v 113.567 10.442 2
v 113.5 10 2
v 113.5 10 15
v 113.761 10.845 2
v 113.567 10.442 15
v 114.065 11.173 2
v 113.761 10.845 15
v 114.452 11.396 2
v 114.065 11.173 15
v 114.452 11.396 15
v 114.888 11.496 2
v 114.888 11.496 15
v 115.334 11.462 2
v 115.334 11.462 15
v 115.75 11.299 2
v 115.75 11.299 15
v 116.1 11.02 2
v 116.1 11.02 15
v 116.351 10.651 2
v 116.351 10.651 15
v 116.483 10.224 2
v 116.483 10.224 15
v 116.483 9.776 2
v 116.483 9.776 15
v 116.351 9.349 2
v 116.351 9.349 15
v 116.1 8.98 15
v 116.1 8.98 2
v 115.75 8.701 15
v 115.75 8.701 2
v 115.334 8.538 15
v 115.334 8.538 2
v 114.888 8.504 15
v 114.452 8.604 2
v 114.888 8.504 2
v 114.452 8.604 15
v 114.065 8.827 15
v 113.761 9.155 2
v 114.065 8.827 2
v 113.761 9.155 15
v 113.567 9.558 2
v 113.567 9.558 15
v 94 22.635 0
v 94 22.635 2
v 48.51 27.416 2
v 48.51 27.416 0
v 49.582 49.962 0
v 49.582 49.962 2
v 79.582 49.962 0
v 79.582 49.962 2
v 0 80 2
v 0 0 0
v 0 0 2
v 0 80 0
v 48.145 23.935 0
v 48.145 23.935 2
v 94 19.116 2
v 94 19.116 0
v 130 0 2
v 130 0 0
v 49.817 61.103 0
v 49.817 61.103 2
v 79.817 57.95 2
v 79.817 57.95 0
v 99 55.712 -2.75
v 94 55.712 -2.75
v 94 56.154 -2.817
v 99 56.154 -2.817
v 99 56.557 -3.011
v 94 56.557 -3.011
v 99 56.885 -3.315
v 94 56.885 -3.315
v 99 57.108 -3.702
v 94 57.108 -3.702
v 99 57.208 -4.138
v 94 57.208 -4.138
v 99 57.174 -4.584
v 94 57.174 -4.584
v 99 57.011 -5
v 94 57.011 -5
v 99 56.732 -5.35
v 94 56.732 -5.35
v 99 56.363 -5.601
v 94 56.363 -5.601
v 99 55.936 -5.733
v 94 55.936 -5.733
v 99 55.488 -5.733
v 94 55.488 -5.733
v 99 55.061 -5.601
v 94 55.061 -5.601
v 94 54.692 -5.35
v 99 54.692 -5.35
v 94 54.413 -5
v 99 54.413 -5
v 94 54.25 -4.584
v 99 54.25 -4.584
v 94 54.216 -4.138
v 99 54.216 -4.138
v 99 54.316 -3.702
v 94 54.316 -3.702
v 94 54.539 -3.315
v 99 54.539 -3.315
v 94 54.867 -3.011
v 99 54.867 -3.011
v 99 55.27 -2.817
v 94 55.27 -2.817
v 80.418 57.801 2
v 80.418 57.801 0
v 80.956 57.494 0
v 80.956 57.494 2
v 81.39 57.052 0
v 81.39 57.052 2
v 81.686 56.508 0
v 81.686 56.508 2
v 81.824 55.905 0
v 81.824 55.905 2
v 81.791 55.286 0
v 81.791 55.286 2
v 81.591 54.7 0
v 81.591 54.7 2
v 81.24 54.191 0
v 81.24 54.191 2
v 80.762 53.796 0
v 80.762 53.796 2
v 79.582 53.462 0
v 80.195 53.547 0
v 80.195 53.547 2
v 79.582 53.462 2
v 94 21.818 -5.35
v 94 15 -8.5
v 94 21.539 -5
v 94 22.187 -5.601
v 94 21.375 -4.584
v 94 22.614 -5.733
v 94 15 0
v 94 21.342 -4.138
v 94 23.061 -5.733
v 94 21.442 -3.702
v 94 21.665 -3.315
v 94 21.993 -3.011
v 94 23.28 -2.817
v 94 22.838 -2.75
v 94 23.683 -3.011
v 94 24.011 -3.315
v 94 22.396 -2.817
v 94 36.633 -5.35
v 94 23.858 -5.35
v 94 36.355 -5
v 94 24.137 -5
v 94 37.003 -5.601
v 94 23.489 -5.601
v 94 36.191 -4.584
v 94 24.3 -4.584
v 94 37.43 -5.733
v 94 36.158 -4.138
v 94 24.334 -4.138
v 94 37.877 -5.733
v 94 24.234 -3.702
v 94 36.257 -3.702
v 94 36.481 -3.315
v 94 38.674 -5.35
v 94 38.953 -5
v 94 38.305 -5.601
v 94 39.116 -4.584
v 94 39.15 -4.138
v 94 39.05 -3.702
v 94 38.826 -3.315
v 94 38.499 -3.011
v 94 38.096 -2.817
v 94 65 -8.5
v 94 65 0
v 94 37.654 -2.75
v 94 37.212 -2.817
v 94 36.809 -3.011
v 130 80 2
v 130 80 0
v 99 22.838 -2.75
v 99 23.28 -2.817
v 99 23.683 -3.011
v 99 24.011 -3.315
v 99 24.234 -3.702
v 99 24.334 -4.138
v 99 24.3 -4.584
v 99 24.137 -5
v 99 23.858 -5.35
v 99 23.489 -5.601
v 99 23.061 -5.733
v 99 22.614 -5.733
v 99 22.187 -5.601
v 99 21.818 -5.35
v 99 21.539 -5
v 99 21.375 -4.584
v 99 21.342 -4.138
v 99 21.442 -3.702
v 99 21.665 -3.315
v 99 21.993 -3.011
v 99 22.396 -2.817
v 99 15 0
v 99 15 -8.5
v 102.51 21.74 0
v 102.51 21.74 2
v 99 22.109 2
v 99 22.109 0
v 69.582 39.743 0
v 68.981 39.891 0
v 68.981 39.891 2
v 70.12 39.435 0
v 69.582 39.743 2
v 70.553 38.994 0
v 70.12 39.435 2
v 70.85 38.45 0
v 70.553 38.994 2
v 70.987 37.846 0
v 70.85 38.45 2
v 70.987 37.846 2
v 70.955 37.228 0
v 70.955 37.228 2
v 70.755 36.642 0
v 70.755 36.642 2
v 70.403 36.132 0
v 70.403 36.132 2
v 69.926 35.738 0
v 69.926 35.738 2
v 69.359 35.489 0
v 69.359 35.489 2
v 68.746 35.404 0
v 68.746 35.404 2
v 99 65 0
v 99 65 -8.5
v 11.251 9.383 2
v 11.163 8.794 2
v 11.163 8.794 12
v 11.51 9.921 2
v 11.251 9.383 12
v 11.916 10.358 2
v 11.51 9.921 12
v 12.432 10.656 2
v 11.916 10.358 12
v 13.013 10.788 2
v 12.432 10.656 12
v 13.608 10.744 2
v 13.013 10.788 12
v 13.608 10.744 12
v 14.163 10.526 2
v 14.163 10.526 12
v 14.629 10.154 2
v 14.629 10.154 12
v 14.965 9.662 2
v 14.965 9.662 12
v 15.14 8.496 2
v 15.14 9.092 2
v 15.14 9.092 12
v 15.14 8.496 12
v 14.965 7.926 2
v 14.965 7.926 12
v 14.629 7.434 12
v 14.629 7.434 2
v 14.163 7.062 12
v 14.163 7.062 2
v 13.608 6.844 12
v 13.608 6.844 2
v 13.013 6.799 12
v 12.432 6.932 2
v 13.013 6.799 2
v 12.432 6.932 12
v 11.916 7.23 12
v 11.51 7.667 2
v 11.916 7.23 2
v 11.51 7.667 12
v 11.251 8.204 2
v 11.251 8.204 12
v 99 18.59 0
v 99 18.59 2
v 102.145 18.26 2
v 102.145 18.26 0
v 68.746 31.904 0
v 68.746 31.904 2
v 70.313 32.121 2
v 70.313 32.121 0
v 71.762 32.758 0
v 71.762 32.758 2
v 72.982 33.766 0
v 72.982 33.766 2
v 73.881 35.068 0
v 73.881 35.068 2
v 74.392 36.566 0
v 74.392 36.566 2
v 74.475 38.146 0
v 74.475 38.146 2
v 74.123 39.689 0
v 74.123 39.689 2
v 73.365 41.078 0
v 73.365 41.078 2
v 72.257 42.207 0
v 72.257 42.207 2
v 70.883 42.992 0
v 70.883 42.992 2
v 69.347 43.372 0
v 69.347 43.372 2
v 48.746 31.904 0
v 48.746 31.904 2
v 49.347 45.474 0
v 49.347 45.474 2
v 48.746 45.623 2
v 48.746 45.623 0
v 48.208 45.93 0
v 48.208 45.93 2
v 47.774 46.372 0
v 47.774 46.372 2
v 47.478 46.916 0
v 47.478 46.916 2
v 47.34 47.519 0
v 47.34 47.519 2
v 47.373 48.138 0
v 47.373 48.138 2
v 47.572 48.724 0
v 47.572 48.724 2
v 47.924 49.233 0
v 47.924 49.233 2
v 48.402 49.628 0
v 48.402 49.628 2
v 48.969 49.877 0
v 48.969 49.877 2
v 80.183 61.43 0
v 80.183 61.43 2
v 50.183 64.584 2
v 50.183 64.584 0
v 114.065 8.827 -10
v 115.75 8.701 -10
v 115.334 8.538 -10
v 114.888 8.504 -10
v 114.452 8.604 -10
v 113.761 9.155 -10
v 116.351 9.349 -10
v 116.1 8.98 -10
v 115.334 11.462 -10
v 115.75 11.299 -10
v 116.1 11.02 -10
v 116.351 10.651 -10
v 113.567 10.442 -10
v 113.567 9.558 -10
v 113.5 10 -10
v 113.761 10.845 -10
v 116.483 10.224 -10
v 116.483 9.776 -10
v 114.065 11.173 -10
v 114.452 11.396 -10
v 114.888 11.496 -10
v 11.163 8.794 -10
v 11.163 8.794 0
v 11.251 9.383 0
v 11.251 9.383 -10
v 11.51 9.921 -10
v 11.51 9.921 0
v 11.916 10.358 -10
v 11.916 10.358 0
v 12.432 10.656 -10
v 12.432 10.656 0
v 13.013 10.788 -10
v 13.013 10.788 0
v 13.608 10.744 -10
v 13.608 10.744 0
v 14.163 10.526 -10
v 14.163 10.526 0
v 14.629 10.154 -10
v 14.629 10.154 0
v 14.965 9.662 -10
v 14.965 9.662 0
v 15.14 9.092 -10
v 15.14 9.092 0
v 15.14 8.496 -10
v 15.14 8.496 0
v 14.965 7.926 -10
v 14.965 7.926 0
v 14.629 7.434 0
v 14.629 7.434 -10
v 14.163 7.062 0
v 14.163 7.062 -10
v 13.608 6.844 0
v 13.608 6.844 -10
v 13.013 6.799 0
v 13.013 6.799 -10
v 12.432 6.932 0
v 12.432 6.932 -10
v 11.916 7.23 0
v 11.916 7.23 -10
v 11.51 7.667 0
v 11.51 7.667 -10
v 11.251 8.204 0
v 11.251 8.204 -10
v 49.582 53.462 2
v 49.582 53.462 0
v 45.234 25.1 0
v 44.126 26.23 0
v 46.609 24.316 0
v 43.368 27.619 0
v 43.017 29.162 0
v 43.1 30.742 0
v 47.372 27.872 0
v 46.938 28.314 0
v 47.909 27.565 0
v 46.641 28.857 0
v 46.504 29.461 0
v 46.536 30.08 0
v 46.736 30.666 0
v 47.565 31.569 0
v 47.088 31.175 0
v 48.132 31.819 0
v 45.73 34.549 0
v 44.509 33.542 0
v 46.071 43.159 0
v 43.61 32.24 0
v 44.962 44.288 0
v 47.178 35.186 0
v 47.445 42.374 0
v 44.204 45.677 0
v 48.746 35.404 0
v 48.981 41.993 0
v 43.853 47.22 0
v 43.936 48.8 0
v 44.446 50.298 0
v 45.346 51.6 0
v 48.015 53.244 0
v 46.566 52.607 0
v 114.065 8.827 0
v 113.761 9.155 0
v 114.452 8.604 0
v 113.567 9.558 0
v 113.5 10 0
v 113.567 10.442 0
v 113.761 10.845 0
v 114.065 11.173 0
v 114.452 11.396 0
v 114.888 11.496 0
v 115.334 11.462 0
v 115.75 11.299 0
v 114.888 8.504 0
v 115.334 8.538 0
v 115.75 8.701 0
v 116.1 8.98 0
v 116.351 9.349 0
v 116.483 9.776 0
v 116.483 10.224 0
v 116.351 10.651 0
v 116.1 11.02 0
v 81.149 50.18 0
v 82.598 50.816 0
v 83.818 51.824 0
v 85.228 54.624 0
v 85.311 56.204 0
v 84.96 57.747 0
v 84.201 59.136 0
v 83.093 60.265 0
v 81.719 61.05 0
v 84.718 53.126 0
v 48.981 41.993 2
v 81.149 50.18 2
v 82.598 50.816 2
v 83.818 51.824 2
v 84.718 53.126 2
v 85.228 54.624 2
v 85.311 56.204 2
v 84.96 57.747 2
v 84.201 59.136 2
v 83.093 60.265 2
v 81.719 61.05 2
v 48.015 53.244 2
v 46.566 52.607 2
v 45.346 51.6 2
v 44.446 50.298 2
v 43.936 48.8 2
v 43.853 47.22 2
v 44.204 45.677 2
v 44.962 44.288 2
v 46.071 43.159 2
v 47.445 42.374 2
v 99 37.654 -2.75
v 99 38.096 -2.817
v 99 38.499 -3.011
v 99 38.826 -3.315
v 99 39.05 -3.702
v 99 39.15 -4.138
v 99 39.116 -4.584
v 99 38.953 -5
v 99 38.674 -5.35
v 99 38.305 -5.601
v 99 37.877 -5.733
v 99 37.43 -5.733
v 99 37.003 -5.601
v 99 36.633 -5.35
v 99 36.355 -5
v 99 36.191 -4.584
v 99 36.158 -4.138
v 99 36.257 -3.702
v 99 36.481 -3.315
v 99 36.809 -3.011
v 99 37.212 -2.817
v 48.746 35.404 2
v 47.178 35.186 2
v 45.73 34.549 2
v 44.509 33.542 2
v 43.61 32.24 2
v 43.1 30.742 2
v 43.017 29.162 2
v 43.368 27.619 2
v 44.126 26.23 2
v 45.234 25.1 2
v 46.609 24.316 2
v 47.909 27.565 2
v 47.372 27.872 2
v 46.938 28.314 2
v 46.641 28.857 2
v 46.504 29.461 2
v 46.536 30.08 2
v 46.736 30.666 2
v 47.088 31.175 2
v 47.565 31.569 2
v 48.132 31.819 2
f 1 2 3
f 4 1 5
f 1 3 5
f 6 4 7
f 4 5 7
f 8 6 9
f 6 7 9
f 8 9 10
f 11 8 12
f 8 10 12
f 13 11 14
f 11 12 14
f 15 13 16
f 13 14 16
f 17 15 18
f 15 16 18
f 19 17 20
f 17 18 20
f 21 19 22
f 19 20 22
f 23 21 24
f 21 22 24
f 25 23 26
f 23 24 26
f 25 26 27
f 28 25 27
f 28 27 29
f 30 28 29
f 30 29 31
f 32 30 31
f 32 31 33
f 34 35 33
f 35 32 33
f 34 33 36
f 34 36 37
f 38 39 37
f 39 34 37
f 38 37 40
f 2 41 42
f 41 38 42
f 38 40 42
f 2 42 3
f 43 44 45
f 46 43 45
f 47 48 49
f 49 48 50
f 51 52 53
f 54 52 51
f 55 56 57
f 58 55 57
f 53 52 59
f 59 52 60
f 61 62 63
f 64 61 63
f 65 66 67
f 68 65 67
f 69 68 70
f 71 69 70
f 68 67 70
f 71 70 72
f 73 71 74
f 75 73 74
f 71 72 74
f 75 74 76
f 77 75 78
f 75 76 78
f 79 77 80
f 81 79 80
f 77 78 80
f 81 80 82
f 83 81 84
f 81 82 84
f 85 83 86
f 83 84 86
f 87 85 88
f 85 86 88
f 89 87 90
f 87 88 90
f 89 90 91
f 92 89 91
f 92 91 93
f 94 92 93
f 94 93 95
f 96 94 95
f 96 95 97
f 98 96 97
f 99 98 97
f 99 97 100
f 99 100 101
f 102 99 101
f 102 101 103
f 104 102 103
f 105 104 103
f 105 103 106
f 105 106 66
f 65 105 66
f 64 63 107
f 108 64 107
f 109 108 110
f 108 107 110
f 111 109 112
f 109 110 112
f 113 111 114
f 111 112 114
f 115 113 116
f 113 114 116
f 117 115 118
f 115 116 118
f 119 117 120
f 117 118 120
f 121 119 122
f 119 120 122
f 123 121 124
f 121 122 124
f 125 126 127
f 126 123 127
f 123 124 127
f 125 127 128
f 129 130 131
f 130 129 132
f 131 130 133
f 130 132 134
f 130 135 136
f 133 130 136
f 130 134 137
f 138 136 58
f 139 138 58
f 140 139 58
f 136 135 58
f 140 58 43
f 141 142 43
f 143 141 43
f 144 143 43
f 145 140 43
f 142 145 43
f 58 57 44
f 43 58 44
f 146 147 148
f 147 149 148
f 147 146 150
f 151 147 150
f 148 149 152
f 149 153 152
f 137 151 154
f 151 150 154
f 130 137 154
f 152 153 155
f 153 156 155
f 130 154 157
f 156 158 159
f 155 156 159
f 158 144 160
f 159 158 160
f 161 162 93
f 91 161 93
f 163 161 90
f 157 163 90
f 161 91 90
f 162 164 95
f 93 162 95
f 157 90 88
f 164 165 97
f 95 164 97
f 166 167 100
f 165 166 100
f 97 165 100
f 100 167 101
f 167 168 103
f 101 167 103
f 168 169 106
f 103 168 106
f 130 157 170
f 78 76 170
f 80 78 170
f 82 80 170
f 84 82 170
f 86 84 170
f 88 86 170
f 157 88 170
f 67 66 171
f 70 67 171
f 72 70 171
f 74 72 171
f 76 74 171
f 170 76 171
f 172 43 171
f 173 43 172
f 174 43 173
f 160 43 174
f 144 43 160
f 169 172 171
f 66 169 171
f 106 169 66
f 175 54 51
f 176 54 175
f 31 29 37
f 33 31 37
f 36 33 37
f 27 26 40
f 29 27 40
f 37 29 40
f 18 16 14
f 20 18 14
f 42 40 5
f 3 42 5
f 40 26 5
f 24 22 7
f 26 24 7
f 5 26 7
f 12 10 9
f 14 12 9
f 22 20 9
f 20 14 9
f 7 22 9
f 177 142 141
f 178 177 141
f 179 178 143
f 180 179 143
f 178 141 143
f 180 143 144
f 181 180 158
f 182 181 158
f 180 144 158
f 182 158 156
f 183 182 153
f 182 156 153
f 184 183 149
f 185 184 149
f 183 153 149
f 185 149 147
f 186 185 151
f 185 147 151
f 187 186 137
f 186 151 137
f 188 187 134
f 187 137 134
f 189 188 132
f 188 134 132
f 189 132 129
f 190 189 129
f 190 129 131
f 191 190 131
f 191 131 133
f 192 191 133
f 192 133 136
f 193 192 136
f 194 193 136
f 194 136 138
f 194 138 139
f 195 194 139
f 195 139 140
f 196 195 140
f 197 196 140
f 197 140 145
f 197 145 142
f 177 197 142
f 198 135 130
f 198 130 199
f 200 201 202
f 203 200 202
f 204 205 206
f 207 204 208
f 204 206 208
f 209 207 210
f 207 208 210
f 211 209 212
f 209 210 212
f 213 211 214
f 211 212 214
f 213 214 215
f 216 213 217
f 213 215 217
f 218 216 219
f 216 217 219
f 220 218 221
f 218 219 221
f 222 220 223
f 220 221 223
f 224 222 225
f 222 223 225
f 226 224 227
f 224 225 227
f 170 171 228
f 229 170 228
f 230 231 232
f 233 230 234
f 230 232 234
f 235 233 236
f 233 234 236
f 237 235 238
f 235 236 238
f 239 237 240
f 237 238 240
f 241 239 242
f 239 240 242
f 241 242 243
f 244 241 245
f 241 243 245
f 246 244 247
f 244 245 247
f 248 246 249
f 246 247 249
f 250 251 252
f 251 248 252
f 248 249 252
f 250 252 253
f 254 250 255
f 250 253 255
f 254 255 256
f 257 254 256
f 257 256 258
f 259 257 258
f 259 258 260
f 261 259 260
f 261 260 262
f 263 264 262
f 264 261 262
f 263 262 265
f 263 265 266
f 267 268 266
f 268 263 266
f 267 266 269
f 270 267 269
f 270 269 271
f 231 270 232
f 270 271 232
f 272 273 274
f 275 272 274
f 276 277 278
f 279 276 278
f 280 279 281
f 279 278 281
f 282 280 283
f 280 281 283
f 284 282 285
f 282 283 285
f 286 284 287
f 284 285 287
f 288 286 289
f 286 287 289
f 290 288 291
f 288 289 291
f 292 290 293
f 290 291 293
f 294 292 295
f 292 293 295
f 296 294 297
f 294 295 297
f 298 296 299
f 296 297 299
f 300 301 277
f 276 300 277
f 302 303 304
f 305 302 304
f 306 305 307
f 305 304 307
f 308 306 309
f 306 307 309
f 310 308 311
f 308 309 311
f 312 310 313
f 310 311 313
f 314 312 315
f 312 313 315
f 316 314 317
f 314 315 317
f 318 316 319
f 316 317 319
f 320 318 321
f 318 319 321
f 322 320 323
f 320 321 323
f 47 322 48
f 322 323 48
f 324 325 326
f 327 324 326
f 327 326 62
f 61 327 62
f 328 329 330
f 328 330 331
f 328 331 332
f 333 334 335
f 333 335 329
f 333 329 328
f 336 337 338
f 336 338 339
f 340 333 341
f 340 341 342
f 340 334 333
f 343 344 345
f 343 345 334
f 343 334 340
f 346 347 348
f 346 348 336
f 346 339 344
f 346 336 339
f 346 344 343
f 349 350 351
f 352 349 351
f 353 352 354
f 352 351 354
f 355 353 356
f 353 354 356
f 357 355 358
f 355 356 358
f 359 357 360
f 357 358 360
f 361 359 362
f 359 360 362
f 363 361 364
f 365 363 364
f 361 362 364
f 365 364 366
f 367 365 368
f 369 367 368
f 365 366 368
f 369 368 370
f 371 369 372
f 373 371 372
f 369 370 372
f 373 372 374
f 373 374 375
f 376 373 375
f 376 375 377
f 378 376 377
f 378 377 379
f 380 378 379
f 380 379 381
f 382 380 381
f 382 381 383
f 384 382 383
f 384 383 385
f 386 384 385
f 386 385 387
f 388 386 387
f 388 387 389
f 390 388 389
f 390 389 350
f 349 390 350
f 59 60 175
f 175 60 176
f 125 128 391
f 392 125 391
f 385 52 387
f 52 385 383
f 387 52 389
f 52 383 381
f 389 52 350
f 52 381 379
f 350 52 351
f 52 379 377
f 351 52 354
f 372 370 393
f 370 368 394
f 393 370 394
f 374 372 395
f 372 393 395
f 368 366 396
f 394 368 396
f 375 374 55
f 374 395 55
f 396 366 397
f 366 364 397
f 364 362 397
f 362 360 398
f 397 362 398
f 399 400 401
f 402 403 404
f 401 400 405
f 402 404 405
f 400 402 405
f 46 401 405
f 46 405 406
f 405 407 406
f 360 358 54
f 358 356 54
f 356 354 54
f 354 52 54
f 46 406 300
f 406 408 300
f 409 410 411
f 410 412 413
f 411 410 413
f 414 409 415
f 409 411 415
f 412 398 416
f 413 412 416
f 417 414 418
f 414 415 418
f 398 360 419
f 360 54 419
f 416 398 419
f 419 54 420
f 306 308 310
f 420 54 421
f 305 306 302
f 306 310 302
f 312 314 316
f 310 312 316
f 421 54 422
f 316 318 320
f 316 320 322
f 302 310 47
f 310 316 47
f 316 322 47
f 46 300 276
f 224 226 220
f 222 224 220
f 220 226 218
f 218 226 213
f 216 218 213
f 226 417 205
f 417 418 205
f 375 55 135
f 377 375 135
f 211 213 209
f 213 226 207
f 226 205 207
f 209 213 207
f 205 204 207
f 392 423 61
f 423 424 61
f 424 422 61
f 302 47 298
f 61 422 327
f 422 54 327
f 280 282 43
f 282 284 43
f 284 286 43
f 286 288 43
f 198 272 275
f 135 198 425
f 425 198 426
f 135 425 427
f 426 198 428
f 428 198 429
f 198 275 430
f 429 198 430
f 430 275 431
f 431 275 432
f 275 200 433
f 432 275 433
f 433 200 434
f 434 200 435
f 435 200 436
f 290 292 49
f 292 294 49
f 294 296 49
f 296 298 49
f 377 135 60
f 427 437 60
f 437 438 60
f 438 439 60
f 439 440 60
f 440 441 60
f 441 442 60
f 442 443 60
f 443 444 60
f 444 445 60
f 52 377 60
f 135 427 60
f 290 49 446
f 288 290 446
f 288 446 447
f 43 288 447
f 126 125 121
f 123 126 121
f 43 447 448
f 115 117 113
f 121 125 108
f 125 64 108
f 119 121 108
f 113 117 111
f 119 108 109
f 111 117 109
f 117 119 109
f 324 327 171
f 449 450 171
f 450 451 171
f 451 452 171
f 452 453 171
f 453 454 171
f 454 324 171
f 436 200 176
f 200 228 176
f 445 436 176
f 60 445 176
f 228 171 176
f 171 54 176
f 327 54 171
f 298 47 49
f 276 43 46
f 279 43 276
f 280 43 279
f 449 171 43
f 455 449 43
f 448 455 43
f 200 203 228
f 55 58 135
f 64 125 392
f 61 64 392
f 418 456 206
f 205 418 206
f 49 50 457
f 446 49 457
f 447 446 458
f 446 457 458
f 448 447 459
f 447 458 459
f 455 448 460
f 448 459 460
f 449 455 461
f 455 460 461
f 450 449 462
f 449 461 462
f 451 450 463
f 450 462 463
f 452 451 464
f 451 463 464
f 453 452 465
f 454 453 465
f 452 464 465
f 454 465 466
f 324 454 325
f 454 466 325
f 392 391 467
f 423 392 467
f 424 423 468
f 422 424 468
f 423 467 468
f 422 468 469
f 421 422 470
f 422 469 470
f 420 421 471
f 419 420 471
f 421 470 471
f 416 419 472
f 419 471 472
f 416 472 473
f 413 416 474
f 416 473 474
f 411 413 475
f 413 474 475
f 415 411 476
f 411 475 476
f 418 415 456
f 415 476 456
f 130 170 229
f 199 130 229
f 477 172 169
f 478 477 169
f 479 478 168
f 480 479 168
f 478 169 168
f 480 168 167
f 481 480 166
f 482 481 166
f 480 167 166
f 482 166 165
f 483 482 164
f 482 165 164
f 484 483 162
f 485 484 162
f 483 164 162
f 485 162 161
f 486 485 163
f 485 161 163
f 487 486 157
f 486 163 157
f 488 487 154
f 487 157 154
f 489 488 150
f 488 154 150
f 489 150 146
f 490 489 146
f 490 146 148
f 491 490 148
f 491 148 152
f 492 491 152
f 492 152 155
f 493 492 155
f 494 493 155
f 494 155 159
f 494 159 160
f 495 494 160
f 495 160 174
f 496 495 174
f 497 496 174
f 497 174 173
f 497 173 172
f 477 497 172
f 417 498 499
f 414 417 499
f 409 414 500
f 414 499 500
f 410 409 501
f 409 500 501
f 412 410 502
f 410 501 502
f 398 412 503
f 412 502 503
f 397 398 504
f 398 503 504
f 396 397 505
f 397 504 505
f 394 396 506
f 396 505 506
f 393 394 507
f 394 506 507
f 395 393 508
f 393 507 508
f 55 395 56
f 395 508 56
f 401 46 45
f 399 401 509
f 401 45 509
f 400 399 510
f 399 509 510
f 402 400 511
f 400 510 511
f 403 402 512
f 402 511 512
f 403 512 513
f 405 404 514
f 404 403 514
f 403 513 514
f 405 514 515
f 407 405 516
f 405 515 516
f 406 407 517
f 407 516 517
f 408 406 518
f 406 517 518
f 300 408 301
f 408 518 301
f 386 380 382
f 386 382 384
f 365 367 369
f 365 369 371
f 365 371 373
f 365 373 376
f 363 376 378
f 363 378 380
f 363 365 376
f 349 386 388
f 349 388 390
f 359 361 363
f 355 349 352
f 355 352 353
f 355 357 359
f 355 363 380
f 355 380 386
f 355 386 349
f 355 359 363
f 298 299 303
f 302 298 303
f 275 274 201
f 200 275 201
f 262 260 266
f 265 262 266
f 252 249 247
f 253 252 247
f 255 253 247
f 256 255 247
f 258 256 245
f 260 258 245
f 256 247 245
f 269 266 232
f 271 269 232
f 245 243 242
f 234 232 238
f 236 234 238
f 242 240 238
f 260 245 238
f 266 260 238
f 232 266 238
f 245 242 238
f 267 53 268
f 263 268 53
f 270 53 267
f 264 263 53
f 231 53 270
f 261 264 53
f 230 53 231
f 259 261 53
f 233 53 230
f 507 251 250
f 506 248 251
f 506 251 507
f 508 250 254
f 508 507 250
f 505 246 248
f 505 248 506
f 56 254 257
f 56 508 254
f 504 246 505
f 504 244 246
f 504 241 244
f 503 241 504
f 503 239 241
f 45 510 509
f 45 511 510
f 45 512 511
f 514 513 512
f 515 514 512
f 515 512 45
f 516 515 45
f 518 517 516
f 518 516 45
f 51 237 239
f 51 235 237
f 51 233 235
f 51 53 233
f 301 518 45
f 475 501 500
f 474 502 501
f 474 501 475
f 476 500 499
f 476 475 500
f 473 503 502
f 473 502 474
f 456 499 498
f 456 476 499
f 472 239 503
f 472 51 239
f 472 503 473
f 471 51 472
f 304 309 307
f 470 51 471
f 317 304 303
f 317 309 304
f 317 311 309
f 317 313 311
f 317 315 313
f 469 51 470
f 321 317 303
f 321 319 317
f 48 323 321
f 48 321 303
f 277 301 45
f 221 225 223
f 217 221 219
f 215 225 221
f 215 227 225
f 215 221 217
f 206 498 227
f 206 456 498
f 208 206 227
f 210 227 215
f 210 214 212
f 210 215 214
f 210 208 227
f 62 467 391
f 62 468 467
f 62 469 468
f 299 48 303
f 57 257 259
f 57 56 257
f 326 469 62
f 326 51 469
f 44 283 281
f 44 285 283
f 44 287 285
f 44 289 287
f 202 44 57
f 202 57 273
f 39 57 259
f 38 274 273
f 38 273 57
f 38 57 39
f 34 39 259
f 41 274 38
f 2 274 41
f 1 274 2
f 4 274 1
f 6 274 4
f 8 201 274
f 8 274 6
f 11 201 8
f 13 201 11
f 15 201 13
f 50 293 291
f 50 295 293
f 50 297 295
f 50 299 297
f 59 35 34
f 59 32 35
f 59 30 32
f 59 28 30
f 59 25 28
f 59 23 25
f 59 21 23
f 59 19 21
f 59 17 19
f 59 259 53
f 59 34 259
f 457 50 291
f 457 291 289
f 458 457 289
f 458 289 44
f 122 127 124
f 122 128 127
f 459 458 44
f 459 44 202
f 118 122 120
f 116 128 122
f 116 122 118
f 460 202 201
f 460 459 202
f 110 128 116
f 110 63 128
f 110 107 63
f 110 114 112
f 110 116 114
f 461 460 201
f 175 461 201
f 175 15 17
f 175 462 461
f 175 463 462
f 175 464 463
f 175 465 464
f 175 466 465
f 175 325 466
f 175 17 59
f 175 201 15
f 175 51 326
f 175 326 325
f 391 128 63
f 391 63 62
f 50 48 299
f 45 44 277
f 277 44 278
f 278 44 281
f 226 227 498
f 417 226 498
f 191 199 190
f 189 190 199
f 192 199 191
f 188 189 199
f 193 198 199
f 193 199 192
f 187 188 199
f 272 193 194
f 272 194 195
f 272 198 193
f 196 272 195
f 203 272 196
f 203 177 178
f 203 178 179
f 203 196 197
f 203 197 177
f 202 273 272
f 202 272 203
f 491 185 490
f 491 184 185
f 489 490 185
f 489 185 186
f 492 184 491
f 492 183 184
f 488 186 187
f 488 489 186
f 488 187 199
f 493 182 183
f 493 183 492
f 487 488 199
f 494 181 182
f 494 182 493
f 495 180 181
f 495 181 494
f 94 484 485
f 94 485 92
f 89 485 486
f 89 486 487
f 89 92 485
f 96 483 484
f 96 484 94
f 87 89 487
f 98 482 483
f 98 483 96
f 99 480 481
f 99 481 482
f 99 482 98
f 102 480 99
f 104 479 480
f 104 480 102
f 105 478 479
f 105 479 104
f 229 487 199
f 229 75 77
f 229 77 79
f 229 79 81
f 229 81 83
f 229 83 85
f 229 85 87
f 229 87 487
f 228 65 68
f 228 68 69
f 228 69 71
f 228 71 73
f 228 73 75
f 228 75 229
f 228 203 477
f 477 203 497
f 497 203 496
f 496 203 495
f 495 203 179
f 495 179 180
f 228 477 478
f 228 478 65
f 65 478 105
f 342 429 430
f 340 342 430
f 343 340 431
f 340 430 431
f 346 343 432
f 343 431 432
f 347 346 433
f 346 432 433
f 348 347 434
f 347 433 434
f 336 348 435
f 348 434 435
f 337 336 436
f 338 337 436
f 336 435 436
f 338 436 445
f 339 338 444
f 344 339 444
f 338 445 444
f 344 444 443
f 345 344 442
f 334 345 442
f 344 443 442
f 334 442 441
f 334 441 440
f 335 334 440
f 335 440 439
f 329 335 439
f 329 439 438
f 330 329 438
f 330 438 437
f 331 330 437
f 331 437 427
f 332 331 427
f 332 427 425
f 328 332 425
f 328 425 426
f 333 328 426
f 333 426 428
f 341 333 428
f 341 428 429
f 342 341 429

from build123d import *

# Parameters (mm, degrees)
SKETCH1_W                = 130
SKETCH1_H                = 80
BOSS_EXTRUDE1_DEPTH      = 2
CUT_EXTRUDE_THIN1_DEPTH  = 3.2
BOSS_EXTRUDE2_DEPTH      = 10
BOSS_EXTRUDE2_DEPTH_BACK = 15
SKETCH5_R                = 1.5
BOSS_EXTRUDE3_DEPTH      = 10
BOSS_EXTRUDE3_DEPTH_BACK = 12
SKETCH6_R                = 2
SKETCH9_W                = 5
SKETCH9_H                = 50
BOSS_EXTRUDE5_DEPTH      = 10.5
SKETCH11_R               = 1.5
CUT_EXTRUDE1_DEPTH       = 7.5


with BuildPart() as part:
    # Sketch1 → Boss-Extrude1 (new body)
    with BuildSketch(Plane.XY):
        with Locations((65, 40)):
            Rectangle(SKETCH1_W, SKETCH1_H)
    extrude(amount=BOSS_EXTRUDE1_DEPTH)

    # Sketch2 → Cut-Extrude-Thin1 (cut)
    with BuildSketch(Plane.XY.offset(2)):
        with BuildLine():
            Line((49.817075189, 61.102777477), (79.817075189, 57.949650419))
            ThreePointArc((79.817075189, 57.949650419), (81.8288026, 55.594220253), (79.581886147, 53.461976154))
            Line((79.581886147, 53.461976154), (49.581886147, 53.461976154))
            ThreePointArc((49.581886147, 53.461976154), (43.839766322, 48.012907902), (48.980847483, 41.993475256))
            Line((48.980847483, 41.993475256), (68.980847483, 39.89139055))
            ThreePointArc((68.980847483, 39.89139055), (70.992574894, 37.535960384), (68.745658441, 35.403716286))
            Line((68.745658441, 35.403716286), (48.745658441, 35.403716286))
            ThreePointArc((48.745658441, 35.403716286), (43.003538616, 29.954648034), (48.144619777, 23.935215387))
            Line((48.144619777, 23.935215387), (102.144619777, 18.259586683))
            Line((102.144619777, 18.259586683), (102.510469398, 21.740413317))
            Line((102.510469398, 21.740413317), (48.510469398, 27.416042021))
            ThreePointArc((48.510469398, 27.416042021), (46.498741988, 29.771472187), (48.745658441, 31.903716286))
            Line((48.745658441, 31.903716286), (68.745658441, 31.903716286))
            ThreePointArc((68.745658441, 31.903716286), (74.487778266, 37.352784537), (69.346697105, 43.372217184))
            Line((69.346697105, 43.372217184), (49.346697105, 45.47430189))
            ThreePointArc((49.346697105, 45.47430189), (47.334969694, 47.829732056), (49.581886147, 49.961976154))
            Line((49.581886147, 49.961976154), (79.581886147, 49.961976154))
            ThreePointArc((79.581886147, 49.961976154), (85.324005972, 55.411044406), (80.182924811, 61.430477052))
            Line((80.182924811, 61.430477052), (50.182924811, 64.58360411))
            Line((50.182924811, 64.58360411), (49.817075189, 61.102777477))
        make_face()
    extrude(amount=-CUT_EXTRUDE_THIN1_DEPTH, mode=Mode.SUBTRACT)

    # Sketch5 → Boss-Extrude2 (add, two sides: drawn at the far end of the back side and taken through both)
    with BuildSketch(Plane(origin=(0, 0, 0), x_dir=(-1, 0, 0), z_dir=(0, 0, -1)).offset(-BOSS_EXTRUDE2_DEPTH_BACK)):
        with Locations((-115, 10)):
            Circle(SKETCH5_R)
    extrude(amount=BOSS_EXTRUDE2_DEPTH + BOSS_EXTRUDE2_DEPTH_BACK)

    # Sketch6 → Boss-Extrude3 (add, two sides: drawn at the far end of the back side and taken through both)
    with BuildSketch(Plane(origin=(0, 0, 0), x_dir=(-1, 0, 0), z_dir=(0, 0, -1)).offset(-BOSS_EXTRUDE3_DEPTH_BACK)):
        with Locations((-13.162577251, 8.793885197)):
            Circle(SKETCH6_R)
    extrude(amount=BOSS_EXTRUDE3_DEPTH + BOSS_EXTRUDE3_DEPTH_BACK)

    # Sketch9 → Boss-Extrude5 (add)
    with BuildSketch(Plane.XY.offset(2)):
        with Locations((96.5, 40)):
            Rectangle(SKETCH9_W, SKETCH9_H)
    extrude(amount=-BOSS_EXTRUDE5_DEPTH)

    # Sketch11 → Cut-Extrude1 (cut)
    with BuildSketch(Plane.ZY.offset(-94)):
        with Locations((-4.25, 55.711976154)):
            Circle(SKETCH11_R)
        with Locations((-4.25, 37.653716286)):
            Circle(SKETCH11_R)
        with Locations((-4.25, 22.837814352)):
            Circle(SKETCH11_R)
    extrude(amount=-CUT_EXTRUDE1_DEPTH, mode=Mode.SUBTRACT)


solid = part.part
